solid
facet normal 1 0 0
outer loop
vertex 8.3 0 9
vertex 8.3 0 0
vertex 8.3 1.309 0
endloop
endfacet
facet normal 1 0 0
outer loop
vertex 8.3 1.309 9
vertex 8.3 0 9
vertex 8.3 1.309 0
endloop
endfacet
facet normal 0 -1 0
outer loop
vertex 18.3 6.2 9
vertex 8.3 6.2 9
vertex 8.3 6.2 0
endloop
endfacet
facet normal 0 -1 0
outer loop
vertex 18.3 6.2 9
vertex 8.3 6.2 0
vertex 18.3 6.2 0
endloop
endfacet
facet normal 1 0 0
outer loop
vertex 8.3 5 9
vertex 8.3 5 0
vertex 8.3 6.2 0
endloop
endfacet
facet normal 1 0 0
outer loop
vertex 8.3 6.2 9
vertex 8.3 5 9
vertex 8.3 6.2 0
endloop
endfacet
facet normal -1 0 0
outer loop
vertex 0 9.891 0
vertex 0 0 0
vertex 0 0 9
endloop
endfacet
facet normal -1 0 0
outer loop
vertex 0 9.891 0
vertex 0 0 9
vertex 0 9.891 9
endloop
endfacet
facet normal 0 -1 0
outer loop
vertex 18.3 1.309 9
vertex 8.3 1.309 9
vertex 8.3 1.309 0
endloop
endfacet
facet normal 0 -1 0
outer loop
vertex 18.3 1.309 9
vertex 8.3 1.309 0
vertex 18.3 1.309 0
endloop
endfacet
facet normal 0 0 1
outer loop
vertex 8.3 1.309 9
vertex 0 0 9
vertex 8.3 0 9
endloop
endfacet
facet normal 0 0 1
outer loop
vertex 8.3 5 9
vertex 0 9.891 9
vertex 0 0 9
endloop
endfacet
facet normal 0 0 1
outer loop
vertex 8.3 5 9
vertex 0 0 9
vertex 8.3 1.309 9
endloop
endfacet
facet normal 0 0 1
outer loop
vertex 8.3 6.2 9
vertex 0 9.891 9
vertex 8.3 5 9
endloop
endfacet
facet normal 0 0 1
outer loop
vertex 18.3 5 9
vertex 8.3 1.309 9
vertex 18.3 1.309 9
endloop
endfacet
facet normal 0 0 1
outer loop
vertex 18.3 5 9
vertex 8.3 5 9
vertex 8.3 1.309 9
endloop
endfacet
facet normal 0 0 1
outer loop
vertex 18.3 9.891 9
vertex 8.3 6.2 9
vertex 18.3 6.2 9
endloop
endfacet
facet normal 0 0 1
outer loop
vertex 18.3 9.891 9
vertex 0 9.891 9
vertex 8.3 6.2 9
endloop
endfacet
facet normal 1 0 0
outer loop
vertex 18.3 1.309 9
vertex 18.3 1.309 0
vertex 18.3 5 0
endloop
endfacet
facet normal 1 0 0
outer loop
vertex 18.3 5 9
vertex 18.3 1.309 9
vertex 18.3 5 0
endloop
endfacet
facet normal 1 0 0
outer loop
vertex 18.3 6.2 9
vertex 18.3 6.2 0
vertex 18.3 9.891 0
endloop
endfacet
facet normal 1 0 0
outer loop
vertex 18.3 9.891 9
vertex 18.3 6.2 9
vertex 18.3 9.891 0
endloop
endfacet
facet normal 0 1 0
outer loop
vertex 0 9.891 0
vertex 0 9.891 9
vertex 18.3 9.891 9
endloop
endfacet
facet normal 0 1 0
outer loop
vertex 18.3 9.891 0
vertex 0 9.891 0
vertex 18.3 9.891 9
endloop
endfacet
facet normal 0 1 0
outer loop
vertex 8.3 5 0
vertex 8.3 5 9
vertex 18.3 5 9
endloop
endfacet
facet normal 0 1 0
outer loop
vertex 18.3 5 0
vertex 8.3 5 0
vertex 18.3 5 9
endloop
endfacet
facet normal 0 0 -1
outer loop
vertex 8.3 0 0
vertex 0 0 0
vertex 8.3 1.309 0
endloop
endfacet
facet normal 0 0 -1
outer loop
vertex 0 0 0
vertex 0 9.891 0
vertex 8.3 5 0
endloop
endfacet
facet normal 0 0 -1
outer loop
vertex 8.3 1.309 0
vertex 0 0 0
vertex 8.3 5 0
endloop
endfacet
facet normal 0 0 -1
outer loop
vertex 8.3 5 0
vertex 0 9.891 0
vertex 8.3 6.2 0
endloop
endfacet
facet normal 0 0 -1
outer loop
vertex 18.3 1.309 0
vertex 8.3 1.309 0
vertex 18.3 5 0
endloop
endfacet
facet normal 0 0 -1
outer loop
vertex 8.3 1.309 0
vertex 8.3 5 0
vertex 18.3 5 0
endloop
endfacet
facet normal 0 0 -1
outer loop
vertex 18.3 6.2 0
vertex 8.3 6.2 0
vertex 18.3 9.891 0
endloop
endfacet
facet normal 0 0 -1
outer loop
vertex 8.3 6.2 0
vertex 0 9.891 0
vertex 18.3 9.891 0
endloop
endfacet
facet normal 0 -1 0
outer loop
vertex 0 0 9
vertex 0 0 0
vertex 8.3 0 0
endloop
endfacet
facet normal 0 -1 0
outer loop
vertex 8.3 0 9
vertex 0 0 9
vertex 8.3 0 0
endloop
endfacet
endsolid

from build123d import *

# Parameters (mm, degrees)
SKETCH1_W           = 8.3
SKETCH1_H           = 9.8906033
BOSS_EXTRUDE1_DEPTH = 9
SKETCH2_W           = 10
SKETCH2_H           = 3.6906033
BOSS_EXTRUDE2_DEPTH = 9


with BuildPart() as part:
    # Sketch1 → Boss-Extrude1 (new body)
    with BuildSketch(Plane.XY):
        with Locations((4.15, 4.94530165)):
            Rectangle(SKETCH1_W, SKETCH1_H)
    extrude(amount=BOSS_EXTRUDE1_DEPTH)

    # Sketch2 → Boss-Extrude2 (add, through all)
    with BuildSketch(Plane.XY.offset(9)):
        with Locations((13.3, 8.04530165)):
            Rectangle(SKETCH2_W, SKETCH2_H)
        with Locations((13.3, 3.15469835)):
            Rectangle(SKETCH2_W, SKETCH2_H)
    extrude(amount=-BOSS_EXTRUDE2_DEPTH)


solid = part.part
